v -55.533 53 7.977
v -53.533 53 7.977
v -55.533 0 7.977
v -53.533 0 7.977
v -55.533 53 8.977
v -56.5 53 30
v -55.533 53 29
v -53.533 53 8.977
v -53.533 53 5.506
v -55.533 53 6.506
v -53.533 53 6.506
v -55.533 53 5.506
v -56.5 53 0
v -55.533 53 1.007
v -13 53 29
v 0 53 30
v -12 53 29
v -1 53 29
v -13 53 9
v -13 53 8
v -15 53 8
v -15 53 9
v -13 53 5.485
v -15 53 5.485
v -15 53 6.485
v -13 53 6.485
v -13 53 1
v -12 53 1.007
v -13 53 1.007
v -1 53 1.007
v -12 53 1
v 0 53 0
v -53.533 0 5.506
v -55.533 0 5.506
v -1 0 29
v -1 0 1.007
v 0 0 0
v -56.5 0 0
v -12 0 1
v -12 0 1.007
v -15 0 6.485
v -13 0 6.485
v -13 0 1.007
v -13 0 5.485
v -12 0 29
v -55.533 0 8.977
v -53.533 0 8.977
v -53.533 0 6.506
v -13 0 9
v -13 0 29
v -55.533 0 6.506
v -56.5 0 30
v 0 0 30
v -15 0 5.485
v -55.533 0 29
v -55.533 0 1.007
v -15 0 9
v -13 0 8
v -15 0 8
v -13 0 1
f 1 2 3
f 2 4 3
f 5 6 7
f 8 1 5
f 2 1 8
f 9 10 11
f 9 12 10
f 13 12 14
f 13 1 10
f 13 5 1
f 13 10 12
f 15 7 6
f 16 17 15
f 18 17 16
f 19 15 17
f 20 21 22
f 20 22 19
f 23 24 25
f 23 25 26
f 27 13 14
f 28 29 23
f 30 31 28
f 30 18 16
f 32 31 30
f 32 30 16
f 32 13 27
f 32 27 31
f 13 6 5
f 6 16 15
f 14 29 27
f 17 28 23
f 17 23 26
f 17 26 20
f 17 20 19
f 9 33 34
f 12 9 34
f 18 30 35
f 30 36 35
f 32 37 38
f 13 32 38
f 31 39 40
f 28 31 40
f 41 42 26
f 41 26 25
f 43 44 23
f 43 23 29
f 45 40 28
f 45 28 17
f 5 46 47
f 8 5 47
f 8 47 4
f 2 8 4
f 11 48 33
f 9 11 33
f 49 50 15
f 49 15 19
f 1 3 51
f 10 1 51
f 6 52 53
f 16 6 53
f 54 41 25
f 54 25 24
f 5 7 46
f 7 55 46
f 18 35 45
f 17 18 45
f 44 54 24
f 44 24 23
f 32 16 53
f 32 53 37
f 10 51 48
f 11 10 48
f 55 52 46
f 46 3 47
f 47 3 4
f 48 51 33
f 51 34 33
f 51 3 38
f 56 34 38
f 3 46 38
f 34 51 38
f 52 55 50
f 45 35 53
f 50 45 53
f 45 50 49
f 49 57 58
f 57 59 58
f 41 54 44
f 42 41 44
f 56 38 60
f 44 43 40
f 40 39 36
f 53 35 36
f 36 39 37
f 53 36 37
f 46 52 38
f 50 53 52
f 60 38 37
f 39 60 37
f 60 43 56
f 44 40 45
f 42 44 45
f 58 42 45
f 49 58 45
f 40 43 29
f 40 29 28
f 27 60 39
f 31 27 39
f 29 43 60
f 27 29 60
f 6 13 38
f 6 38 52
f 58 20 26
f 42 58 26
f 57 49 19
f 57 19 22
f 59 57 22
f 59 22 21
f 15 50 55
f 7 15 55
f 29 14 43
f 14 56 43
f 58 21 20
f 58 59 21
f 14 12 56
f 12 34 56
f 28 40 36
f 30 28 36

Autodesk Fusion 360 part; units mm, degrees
sketch "Esquisse1" plane through (0, 0, 0) normal (0, 1, 0) x (1, 0, 0)
  line L0 (0, 0) -> (-56.5, 0)
  line L1 (-56.5, 0) -> (-56.5, -30)
  line L2 (-56.5, -30) -> (0, -30)
  line L3 (0, -30) -> (0, 0)
  line L4 (-1, -29) -> (-55.5331, -29)
  line L5 (-55.5331, -29) -> (-55.5331, -1.0074)
  line L6 (-55.5331, -1.0074) -> (-1, -1.0074)
  line L7 (-1, -1.0074) -> (-1, -29)
  line L8 (-55.5331, -1.0074) -> (-1.0331, -1.0074)
  line L9 (-1.0331, -1.0074) -> (-1.0331, -28.0074)
  line L10 (-55.5331, -28.0074) -> (-55.5331, -1.0074)
  line L11 (-12, -29) -> (-13, -29)
  line L12 (-13, -29) -> (-13, -1)
  line L13 (-13, -1) -> (-12, -1)
  line L14 (-12, -1) -> (-12, -29)
  line L15 (-13, -9) -> (-15, -9)
  line L16 (-15, -9) -> (-15, -8)
  line L17 (-15, -8) -> (-13, -8)
  line L18 (-13, -8) -> (-13, -9)
  line L19 (-13, -6.485) -> (-15, -6.485)
  line L20 (-15, -6.485) -> (-15, -5.485)
  line L21 (-15, -5.485) -> (-13, -5.485)
  line L22 (-13, -5.485) -> (-13, -6.485)
  line L23 (-55.5331, -8.9771) -> (-53.5331, -8.9771)
  line L24 (-53.5331, -8.9771) -> (-53.5331, -7.9771)
  line L25 (-53.5331, -7.9771) -> (-55.5331, -7.9771)
  line L26 (-55.5331, -7.9771) -> (-55.5331, -8.9771)
  line L27 (-55.5331, -6.5064) -> (-53.5331, -6.5064)
  line L28 (-53.5331, -6.5064) -> (-53.5331, -5.5064)
  line L29 (-53.5331, -5.5064) -> (-55.5331, -5.5064)
  line L30 (-55.5331, -5.5064) -> (-55.5331, -6.5064)
extrude "Extrusion2" add sketch "Esquisse1" along normal blind 53 contours L0 L1 L2 L3 | L4 L6 L8 L11 L12 L14 L18 L22 | L12 L15 L16 L17 L18 | L12 L19 L20 L21 L22 | L5 L10 L23 L24 L25 L26 | L5 L10 L27 L28 L29 L30
sketch "Esquisse2" plane through (0, 0, 0) normal (0, -1, 0) x (1, 0, 0)
  line L0 (-12, 1.0074) -> (-12, 29)
  line L1 (-12, 29) -> (-1, 29)
  line L2 (-1, 29) -> (-1, 1.0074)
  line L3 (-1, 1.0074) -> (-12, 1.0074)
  line L4 (-12, 1.0074) -> (-12, 1)
  line L5 (-12, 1) -> (-13, 1)
  line L6 (-13, 1) -> (-13, 1.0074)
  line L7 (-13, 1.0074) -> (-55.5331, 1.0074)
  line L8 (-55.5331, 1.0074) -> (-55.5331, 5.5064)
  line L9 (-55.5331, 5.5064) -> (-53.5331, 5.5064)
  line L10 (-53.5331, 5.5064) -> (-53.5331, 6.5064)
  line L11 (-53.5331, 6.5064) -> (-55.5331, 6.5064)
  line L12 (-55.5331, 6.5064) -> (-55.5331, 7.9771)
  line L13 (-55.5331, 7.9771) -> (-53.5331, 7.9771)
  line L14 (-53.5331, 7.9771) -> (-53.5331, 8.9771)
  line L15 (-53.5331, 8.9771) -> (-55.5331, 8.9771)
  line L16 (-55.5331, 8.9771) -> (-55.5331, 29)
  line L17 (-55.5331, 29) -> (-13, 29)
  line L18 (-13, 29) -> (-13, 9)
  line L19 (-13, 9) -> (-15, 9)
  line L20 (-15, 9) -> (-15, 8)
  line L21 (-15, 8) -> (-13, 8)
  line L22 (-13, 8) -> (-13, 6.485)
  line L23 (-13, 6.485) -> (-15, 6.485)
  line L24 (-15, 6.485) -> (-15, 5.485)
  line L25 (-15, 5.485) -> (-13, 5.485)
  line L26 (-13, 5.485) -> (-13, 1.0074)
  line L27 (-13, 1.0074) -> (-12, 1.0074)
  line L28 (0, 0) -> (0, 30)
  line L29 (0, 30) -> (-56.5, 30)
  line L30 (-56.5, 30) -> (-56.5, 0)
  line L31 (-56.5, 0) -> (0, 0)
extrude "Extrusion1" [suppressed]
